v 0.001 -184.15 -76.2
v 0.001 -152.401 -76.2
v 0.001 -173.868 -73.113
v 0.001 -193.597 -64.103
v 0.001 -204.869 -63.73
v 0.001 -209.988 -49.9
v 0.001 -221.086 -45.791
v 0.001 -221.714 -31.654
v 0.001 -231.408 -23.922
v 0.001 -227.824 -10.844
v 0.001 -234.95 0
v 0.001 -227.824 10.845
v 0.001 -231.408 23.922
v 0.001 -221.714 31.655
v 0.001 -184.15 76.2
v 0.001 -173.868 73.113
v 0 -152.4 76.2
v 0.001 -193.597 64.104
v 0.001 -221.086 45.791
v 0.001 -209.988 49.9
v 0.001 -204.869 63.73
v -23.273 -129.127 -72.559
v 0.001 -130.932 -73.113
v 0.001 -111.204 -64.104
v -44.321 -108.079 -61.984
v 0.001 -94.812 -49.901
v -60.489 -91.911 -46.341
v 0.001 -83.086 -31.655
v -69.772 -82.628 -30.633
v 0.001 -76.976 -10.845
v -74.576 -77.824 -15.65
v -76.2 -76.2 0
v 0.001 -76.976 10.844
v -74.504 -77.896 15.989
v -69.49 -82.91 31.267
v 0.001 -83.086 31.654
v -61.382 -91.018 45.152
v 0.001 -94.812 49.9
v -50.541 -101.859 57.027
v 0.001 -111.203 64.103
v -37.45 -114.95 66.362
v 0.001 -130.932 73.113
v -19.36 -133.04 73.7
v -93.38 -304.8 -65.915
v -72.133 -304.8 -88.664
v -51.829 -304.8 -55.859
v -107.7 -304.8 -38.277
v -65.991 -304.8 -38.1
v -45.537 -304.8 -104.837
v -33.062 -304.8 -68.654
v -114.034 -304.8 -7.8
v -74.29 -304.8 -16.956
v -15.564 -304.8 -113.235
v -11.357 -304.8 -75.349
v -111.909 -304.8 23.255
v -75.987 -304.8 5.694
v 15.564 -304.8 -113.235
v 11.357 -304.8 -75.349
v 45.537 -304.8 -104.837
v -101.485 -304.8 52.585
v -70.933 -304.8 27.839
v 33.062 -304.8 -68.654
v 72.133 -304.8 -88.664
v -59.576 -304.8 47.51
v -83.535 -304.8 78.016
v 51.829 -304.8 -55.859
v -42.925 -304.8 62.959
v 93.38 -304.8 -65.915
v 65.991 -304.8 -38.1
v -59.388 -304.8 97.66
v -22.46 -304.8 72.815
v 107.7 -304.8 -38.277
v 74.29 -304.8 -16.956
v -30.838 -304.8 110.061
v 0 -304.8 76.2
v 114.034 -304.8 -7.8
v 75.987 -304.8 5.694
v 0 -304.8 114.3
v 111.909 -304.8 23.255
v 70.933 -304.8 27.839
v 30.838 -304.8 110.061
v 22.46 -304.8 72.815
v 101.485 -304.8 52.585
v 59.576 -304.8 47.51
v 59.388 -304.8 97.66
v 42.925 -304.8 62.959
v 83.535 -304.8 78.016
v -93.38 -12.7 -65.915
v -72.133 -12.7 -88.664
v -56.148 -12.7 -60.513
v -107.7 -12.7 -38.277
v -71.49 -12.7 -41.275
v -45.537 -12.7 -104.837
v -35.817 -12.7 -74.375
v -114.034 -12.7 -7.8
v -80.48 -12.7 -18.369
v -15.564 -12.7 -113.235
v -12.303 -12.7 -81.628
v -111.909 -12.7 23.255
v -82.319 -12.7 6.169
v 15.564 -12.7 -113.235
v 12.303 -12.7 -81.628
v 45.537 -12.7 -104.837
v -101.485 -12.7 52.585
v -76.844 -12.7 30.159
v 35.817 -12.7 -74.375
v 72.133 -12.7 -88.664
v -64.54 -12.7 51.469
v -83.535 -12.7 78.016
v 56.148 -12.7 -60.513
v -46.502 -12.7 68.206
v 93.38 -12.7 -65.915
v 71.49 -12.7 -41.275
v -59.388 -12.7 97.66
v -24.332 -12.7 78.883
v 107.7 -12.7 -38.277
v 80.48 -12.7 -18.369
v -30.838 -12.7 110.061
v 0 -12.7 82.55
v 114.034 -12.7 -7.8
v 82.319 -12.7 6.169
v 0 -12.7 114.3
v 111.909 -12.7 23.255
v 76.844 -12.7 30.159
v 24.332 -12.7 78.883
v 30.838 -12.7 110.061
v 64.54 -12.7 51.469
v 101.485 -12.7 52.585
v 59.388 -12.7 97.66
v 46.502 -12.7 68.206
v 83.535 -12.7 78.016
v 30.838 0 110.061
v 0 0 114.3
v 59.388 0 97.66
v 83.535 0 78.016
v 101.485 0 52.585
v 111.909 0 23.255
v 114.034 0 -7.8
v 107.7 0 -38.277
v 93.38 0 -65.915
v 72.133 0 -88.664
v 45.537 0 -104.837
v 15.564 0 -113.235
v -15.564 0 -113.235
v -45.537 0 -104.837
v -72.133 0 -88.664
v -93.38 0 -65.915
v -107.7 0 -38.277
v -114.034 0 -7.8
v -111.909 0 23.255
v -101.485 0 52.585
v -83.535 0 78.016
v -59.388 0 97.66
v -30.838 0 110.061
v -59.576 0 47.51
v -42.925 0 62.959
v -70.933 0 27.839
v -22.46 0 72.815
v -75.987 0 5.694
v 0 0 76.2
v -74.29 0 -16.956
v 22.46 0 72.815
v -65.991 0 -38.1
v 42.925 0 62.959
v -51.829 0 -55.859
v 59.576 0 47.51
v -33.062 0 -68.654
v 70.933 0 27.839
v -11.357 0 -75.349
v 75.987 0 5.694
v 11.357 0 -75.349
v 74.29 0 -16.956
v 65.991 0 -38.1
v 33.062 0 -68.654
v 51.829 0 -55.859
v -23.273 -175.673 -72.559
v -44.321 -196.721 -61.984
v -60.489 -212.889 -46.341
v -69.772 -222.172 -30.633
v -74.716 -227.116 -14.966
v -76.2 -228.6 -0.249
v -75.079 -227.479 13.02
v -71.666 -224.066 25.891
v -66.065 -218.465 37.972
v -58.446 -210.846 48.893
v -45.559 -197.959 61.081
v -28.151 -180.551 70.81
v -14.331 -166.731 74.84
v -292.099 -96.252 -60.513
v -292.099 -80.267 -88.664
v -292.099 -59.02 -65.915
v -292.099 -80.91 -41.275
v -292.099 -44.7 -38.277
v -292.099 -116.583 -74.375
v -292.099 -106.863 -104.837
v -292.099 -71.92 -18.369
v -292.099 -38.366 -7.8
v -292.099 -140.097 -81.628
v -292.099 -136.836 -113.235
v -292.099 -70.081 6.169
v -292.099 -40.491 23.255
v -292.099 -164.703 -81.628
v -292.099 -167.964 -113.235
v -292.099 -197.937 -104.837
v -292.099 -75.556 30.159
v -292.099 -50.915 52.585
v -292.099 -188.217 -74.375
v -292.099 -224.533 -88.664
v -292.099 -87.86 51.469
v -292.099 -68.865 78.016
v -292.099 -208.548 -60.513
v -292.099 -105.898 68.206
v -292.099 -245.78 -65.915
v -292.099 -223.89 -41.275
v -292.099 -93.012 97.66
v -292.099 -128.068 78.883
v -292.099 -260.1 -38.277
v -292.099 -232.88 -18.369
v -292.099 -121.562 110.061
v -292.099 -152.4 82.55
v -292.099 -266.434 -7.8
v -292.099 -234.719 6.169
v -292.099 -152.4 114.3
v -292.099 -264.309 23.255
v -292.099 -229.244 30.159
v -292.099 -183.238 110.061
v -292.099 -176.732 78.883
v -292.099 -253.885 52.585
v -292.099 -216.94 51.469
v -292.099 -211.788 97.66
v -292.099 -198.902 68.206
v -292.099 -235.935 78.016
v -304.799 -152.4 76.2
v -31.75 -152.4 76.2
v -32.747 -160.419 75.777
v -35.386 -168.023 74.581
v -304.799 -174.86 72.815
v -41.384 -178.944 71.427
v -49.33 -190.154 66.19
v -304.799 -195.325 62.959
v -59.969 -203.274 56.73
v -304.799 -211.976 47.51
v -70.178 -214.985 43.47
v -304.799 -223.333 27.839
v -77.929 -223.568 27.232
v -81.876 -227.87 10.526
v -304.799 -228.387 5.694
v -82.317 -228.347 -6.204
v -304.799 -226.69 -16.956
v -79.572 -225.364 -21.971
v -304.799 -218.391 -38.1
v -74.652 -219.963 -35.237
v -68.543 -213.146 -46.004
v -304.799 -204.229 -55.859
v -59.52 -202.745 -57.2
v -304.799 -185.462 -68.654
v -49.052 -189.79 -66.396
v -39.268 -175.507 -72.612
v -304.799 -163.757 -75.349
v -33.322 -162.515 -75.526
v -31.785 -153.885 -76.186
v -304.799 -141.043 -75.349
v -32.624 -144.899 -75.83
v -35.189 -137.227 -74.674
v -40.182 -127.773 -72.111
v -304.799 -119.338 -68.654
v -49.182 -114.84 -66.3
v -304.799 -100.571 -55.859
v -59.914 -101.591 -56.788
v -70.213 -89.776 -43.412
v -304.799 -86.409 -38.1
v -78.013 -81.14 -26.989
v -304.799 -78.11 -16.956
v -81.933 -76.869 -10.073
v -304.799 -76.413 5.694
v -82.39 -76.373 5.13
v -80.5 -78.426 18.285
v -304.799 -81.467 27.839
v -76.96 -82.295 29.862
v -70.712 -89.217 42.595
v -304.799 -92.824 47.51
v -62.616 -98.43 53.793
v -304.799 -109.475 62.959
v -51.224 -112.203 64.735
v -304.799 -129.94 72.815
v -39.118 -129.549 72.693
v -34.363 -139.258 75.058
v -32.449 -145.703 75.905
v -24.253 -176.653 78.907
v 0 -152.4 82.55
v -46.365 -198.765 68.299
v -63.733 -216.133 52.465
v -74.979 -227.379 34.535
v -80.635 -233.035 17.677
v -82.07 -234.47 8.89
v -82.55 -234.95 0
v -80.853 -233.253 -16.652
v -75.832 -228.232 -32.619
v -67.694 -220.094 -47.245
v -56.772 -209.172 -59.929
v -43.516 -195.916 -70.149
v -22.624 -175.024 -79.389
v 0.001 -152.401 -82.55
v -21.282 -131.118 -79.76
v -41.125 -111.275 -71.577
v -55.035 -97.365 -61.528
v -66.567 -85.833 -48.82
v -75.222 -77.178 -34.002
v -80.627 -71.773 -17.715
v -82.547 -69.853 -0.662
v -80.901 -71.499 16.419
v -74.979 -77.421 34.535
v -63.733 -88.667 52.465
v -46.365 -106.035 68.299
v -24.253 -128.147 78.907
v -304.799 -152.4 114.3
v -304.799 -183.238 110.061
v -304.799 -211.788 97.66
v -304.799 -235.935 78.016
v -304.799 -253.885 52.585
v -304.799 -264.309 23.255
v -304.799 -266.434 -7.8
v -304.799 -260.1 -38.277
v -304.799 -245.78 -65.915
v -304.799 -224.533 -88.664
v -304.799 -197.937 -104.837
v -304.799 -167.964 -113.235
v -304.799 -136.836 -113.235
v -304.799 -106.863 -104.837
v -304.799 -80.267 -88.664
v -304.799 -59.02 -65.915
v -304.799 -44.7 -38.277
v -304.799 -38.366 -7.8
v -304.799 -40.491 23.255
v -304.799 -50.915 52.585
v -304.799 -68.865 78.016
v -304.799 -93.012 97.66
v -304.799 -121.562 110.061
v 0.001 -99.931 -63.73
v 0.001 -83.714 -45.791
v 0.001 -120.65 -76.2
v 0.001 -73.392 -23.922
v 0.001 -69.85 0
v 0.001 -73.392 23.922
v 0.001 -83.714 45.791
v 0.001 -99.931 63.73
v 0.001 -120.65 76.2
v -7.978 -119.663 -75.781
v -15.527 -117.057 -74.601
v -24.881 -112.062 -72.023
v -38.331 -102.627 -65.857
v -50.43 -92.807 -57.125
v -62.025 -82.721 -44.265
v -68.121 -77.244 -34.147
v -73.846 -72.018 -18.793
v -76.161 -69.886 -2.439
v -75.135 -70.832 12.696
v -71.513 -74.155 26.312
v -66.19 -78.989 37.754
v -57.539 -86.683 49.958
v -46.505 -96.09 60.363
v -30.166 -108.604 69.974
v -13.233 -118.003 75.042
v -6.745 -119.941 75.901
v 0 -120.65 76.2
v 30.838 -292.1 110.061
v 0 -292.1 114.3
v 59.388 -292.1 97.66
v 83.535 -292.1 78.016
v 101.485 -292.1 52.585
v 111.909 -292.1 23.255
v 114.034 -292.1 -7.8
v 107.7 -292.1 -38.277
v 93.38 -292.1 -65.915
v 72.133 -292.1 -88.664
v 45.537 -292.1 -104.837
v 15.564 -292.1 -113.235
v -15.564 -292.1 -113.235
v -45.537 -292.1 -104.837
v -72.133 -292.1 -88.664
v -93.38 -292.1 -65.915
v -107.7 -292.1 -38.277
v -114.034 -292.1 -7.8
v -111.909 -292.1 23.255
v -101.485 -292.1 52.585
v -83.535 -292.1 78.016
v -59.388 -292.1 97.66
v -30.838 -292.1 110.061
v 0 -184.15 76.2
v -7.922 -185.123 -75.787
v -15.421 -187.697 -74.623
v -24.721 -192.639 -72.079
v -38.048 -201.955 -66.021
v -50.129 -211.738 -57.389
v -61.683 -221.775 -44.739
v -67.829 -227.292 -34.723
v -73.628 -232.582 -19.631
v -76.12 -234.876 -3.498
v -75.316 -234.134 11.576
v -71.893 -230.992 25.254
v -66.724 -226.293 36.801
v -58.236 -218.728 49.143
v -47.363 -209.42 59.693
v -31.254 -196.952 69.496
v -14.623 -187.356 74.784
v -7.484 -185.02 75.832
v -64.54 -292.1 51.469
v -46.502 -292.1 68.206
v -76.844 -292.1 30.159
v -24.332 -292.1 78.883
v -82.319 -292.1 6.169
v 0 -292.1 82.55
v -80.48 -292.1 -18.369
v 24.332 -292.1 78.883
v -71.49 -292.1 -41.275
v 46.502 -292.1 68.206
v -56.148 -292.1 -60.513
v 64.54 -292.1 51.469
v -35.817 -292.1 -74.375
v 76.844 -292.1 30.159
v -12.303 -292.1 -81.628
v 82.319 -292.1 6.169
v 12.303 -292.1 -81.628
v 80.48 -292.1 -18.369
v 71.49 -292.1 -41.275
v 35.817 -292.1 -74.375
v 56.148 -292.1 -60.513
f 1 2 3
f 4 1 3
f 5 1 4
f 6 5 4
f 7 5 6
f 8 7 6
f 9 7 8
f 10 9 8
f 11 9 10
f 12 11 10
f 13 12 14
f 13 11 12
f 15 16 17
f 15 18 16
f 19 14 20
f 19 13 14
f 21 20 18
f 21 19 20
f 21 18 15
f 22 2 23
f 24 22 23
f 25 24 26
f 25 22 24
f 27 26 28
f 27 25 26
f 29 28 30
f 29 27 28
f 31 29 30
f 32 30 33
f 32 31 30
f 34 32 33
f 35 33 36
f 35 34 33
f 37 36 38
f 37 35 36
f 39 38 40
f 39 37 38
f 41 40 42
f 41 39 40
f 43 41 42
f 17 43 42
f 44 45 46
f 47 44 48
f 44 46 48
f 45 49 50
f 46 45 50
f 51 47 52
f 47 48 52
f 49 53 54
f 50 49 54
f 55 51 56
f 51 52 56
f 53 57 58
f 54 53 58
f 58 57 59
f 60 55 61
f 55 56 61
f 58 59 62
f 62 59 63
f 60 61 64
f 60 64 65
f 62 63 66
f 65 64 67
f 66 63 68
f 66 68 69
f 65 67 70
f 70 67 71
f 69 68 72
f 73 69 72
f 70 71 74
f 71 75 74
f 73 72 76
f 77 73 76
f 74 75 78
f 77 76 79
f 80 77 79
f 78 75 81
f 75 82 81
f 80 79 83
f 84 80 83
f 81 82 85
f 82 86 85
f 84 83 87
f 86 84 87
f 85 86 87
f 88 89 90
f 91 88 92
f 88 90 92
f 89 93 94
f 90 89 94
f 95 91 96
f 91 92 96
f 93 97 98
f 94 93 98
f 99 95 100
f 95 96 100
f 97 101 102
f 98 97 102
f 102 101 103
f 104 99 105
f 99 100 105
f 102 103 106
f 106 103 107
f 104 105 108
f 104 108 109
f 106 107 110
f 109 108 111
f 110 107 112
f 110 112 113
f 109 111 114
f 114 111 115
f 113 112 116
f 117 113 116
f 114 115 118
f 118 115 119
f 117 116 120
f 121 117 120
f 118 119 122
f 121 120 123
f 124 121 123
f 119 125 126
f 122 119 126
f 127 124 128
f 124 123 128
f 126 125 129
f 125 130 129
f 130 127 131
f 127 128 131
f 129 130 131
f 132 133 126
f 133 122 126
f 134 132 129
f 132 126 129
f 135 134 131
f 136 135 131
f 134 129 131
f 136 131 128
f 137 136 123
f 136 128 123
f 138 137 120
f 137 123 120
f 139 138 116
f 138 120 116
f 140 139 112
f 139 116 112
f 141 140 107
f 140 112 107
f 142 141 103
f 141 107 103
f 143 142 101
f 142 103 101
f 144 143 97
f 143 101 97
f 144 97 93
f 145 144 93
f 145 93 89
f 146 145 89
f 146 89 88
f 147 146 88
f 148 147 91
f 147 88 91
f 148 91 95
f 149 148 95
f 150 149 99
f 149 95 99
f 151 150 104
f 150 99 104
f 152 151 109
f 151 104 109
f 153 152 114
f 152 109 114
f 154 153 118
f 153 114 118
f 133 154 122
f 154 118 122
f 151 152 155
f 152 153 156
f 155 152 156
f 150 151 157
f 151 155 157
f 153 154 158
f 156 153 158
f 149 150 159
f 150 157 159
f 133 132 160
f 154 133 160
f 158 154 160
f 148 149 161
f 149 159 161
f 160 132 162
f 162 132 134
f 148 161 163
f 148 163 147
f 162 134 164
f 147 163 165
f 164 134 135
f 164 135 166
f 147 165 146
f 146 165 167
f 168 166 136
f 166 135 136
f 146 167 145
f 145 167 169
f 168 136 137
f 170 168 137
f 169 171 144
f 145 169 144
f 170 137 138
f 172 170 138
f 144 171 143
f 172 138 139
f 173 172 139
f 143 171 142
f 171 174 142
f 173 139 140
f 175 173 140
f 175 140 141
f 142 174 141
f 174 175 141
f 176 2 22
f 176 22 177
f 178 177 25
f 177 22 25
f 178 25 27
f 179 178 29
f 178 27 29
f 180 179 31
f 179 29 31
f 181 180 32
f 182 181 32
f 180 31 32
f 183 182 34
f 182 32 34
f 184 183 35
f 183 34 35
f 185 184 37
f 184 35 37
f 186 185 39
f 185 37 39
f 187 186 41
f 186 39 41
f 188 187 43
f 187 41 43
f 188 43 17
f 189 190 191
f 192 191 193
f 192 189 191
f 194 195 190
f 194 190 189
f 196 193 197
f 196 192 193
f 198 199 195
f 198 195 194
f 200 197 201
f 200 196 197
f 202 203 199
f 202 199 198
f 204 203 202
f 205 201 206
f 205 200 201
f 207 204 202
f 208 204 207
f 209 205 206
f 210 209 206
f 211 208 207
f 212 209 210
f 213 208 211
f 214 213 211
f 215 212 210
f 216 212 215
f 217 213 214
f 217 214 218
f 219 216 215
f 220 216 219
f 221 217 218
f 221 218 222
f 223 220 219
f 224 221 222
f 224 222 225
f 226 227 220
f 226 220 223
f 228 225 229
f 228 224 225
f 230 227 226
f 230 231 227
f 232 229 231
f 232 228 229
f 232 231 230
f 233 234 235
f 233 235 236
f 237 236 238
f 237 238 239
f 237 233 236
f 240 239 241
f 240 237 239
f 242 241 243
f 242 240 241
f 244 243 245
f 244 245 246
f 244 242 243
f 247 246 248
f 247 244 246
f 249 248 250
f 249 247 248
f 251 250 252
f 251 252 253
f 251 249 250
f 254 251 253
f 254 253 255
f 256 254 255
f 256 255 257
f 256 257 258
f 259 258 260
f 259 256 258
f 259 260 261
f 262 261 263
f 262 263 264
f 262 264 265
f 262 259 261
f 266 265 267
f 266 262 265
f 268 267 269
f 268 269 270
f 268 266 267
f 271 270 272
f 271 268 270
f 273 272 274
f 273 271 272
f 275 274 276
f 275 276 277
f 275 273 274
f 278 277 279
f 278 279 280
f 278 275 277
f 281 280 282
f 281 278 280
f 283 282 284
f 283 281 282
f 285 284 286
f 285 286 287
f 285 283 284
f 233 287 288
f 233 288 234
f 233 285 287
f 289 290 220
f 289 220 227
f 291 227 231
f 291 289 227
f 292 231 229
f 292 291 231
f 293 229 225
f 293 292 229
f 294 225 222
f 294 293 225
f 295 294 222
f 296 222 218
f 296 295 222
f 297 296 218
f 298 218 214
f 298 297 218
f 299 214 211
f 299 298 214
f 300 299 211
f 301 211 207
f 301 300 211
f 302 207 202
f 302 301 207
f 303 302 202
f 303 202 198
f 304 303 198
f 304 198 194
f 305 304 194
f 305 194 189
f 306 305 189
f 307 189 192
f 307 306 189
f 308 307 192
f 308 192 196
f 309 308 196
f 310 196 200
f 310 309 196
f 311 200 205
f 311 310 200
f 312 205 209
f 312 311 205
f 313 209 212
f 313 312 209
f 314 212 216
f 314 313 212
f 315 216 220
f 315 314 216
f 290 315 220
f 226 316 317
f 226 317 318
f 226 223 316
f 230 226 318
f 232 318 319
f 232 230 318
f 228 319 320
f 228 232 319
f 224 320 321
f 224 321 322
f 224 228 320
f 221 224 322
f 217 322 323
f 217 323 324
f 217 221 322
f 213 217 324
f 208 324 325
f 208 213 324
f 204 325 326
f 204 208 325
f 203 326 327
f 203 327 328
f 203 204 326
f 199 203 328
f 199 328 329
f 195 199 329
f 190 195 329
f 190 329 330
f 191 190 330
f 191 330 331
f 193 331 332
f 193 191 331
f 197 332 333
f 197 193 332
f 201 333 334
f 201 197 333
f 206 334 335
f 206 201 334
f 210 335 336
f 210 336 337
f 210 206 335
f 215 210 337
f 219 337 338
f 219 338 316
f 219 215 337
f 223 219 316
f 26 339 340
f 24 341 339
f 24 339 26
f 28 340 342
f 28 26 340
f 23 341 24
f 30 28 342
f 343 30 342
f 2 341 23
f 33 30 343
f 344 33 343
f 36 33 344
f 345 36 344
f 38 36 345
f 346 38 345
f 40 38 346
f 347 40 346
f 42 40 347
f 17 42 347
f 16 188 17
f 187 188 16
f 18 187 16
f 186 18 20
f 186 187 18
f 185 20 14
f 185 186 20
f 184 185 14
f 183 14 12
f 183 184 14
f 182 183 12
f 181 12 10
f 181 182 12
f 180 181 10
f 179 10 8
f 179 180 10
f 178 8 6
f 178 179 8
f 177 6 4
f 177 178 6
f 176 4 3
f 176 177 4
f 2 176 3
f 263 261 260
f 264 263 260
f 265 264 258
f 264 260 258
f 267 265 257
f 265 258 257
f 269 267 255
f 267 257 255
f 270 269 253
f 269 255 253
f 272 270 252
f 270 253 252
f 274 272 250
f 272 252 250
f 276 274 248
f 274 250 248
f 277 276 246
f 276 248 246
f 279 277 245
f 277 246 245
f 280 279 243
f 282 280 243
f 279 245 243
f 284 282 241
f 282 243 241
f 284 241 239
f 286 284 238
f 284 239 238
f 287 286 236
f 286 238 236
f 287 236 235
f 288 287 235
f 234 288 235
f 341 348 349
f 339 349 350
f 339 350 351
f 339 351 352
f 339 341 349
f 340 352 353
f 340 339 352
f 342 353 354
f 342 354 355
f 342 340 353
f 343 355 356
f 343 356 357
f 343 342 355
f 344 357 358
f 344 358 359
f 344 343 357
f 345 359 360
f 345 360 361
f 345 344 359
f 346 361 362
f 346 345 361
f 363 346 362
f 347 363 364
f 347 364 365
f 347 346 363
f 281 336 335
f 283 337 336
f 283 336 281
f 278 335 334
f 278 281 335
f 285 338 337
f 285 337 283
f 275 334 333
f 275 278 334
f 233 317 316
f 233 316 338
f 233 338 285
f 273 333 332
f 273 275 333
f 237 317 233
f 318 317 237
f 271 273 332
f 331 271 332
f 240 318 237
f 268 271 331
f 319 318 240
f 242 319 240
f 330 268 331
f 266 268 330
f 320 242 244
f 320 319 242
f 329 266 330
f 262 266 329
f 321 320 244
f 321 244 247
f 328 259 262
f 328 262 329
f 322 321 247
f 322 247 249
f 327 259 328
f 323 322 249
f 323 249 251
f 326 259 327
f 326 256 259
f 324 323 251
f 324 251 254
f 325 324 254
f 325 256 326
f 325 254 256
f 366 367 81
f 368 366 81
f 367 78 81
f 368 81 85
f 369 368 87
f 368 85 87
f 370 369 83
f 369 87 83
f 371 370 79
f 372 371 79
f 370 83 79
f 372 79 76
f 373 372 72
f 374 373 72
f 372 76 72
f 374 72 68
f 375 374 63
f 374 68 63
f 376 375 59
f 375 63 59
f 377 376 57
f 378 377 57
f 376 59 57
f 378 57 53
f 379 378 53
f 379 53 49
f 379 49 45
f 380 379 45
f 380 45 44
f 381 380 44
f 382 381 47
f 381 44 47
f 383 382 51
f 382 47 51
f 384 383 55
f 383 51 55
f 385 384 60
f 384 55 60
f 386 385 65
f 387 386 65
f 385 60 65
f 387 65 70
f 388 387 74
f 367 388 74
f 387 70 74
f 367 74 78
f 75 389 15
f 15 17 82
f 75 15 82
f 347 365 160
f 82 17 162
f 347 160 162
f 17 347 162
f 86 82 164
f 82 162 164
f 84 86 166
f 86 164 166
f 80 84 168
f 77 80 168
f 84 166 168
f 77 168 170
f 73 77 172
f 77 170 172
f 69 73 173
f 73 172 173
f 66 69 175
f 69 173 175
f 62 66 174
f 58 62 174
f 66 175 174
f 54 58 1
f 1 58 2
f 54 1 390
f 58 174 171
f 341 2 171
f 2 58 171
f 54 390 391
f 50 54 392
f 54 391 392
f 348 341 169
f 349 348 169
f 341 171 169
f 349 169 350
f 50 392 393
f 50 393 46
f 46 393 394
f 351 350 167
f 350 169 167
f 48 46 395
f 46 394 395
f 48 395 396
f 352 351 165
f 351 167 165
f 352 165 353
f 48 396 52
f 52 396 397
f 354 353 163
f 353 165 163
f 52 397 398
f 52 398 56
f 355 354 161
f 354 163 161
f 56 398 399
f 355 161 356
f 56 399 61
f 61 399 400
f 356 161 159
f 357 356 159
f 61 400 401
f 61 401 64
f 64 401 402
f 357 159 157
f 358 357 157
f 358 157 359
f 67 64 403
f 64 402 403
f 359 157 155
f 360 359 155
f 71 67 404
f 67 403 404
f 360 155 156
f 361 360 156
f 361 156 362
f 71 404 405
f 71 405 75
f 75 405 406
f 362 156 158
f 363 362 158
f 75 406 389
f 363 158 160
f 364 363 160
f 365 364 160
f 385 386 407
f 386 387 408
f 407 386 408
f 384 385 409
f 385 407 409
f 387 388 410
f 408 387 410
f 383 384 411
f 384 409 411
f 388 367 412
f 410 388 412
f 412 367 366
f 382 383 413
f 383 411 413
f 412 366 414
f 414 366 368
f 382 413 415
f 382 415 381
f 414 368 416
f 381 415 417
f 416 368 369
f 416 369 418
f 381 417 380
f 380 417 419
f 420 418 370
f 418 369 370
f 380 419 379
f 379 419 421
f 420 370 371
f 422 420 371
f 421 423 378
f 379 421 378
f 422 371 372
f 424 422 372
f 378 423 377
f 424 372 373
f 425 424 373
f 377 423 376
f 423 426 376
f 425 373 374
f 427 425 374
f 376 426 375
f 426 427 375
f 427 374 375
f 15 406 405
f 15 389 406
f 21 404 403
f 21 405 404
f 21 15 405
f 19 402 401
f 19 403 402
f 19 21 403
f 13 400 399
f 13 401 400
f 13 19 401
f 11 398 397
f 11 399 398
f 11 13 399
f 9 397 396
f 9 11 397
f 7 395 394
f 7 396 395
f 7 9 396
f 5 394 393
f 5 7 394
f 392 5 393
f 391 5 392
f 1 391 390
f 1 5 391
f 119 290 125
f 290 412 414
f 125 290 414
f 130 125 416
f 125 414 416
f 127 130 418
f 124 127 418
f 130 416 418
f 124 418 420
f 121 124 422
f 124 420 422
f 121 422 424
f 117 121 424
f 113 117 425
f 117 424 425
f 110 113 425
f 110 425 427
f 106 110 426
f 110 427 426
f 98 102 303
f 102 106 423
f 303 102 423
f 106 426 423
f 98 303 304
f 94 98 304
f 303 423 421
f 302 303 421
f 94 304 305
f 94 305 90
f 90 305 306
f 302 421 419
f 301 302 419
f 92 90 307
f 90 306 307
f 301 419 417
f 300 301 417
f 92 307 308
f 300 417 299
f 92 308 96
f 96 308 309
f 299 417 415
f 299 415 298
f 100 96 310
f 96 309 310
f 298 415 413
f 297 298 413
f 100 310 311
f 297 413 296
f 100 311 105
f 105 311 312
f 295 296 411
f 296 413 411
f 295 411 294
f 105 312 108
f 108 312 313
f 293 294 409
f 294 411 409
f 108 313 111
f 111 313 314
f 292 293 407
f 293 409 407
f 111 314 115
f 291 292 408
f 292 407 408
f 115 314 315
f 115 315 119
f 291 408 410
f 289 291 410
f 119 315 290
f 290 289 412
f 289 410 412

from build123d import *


with BuildPart() as f1:
    # F0 (on Right) → F1 (revolve)
    with BuildSketch(Plane.YZ):
        Polygon((0, 76.2), (0, 114.3), (-12.7, 114.3), (-12.7, 82.55), (-292.1, 82.55), (-292.1, 114.3), (-304.8, 114.3), (-304.8, 76.2), align=None)
    revolve(axis=Axis((0, 69.986956, 0), (0, 1, 0)))

    # F3 (on mid) → F4 (revolve)
    with BuildSketch(Plane(origin=(0, -152.4, 0), x_dir=(-1, 0, 0), z_dir=(0, 1, 0))):
        Polygon((304.799496, 76.2), (304.799496, 114.3), (292.099496, 114.3), (292.099496, 82.55), (-0.000504, 82.55), (-0.000504, 76.2), align=None)
    revolve(axis=Axis((-10.273844, -152.4, 0), (1, 0, 0)))


solid = f1.part
